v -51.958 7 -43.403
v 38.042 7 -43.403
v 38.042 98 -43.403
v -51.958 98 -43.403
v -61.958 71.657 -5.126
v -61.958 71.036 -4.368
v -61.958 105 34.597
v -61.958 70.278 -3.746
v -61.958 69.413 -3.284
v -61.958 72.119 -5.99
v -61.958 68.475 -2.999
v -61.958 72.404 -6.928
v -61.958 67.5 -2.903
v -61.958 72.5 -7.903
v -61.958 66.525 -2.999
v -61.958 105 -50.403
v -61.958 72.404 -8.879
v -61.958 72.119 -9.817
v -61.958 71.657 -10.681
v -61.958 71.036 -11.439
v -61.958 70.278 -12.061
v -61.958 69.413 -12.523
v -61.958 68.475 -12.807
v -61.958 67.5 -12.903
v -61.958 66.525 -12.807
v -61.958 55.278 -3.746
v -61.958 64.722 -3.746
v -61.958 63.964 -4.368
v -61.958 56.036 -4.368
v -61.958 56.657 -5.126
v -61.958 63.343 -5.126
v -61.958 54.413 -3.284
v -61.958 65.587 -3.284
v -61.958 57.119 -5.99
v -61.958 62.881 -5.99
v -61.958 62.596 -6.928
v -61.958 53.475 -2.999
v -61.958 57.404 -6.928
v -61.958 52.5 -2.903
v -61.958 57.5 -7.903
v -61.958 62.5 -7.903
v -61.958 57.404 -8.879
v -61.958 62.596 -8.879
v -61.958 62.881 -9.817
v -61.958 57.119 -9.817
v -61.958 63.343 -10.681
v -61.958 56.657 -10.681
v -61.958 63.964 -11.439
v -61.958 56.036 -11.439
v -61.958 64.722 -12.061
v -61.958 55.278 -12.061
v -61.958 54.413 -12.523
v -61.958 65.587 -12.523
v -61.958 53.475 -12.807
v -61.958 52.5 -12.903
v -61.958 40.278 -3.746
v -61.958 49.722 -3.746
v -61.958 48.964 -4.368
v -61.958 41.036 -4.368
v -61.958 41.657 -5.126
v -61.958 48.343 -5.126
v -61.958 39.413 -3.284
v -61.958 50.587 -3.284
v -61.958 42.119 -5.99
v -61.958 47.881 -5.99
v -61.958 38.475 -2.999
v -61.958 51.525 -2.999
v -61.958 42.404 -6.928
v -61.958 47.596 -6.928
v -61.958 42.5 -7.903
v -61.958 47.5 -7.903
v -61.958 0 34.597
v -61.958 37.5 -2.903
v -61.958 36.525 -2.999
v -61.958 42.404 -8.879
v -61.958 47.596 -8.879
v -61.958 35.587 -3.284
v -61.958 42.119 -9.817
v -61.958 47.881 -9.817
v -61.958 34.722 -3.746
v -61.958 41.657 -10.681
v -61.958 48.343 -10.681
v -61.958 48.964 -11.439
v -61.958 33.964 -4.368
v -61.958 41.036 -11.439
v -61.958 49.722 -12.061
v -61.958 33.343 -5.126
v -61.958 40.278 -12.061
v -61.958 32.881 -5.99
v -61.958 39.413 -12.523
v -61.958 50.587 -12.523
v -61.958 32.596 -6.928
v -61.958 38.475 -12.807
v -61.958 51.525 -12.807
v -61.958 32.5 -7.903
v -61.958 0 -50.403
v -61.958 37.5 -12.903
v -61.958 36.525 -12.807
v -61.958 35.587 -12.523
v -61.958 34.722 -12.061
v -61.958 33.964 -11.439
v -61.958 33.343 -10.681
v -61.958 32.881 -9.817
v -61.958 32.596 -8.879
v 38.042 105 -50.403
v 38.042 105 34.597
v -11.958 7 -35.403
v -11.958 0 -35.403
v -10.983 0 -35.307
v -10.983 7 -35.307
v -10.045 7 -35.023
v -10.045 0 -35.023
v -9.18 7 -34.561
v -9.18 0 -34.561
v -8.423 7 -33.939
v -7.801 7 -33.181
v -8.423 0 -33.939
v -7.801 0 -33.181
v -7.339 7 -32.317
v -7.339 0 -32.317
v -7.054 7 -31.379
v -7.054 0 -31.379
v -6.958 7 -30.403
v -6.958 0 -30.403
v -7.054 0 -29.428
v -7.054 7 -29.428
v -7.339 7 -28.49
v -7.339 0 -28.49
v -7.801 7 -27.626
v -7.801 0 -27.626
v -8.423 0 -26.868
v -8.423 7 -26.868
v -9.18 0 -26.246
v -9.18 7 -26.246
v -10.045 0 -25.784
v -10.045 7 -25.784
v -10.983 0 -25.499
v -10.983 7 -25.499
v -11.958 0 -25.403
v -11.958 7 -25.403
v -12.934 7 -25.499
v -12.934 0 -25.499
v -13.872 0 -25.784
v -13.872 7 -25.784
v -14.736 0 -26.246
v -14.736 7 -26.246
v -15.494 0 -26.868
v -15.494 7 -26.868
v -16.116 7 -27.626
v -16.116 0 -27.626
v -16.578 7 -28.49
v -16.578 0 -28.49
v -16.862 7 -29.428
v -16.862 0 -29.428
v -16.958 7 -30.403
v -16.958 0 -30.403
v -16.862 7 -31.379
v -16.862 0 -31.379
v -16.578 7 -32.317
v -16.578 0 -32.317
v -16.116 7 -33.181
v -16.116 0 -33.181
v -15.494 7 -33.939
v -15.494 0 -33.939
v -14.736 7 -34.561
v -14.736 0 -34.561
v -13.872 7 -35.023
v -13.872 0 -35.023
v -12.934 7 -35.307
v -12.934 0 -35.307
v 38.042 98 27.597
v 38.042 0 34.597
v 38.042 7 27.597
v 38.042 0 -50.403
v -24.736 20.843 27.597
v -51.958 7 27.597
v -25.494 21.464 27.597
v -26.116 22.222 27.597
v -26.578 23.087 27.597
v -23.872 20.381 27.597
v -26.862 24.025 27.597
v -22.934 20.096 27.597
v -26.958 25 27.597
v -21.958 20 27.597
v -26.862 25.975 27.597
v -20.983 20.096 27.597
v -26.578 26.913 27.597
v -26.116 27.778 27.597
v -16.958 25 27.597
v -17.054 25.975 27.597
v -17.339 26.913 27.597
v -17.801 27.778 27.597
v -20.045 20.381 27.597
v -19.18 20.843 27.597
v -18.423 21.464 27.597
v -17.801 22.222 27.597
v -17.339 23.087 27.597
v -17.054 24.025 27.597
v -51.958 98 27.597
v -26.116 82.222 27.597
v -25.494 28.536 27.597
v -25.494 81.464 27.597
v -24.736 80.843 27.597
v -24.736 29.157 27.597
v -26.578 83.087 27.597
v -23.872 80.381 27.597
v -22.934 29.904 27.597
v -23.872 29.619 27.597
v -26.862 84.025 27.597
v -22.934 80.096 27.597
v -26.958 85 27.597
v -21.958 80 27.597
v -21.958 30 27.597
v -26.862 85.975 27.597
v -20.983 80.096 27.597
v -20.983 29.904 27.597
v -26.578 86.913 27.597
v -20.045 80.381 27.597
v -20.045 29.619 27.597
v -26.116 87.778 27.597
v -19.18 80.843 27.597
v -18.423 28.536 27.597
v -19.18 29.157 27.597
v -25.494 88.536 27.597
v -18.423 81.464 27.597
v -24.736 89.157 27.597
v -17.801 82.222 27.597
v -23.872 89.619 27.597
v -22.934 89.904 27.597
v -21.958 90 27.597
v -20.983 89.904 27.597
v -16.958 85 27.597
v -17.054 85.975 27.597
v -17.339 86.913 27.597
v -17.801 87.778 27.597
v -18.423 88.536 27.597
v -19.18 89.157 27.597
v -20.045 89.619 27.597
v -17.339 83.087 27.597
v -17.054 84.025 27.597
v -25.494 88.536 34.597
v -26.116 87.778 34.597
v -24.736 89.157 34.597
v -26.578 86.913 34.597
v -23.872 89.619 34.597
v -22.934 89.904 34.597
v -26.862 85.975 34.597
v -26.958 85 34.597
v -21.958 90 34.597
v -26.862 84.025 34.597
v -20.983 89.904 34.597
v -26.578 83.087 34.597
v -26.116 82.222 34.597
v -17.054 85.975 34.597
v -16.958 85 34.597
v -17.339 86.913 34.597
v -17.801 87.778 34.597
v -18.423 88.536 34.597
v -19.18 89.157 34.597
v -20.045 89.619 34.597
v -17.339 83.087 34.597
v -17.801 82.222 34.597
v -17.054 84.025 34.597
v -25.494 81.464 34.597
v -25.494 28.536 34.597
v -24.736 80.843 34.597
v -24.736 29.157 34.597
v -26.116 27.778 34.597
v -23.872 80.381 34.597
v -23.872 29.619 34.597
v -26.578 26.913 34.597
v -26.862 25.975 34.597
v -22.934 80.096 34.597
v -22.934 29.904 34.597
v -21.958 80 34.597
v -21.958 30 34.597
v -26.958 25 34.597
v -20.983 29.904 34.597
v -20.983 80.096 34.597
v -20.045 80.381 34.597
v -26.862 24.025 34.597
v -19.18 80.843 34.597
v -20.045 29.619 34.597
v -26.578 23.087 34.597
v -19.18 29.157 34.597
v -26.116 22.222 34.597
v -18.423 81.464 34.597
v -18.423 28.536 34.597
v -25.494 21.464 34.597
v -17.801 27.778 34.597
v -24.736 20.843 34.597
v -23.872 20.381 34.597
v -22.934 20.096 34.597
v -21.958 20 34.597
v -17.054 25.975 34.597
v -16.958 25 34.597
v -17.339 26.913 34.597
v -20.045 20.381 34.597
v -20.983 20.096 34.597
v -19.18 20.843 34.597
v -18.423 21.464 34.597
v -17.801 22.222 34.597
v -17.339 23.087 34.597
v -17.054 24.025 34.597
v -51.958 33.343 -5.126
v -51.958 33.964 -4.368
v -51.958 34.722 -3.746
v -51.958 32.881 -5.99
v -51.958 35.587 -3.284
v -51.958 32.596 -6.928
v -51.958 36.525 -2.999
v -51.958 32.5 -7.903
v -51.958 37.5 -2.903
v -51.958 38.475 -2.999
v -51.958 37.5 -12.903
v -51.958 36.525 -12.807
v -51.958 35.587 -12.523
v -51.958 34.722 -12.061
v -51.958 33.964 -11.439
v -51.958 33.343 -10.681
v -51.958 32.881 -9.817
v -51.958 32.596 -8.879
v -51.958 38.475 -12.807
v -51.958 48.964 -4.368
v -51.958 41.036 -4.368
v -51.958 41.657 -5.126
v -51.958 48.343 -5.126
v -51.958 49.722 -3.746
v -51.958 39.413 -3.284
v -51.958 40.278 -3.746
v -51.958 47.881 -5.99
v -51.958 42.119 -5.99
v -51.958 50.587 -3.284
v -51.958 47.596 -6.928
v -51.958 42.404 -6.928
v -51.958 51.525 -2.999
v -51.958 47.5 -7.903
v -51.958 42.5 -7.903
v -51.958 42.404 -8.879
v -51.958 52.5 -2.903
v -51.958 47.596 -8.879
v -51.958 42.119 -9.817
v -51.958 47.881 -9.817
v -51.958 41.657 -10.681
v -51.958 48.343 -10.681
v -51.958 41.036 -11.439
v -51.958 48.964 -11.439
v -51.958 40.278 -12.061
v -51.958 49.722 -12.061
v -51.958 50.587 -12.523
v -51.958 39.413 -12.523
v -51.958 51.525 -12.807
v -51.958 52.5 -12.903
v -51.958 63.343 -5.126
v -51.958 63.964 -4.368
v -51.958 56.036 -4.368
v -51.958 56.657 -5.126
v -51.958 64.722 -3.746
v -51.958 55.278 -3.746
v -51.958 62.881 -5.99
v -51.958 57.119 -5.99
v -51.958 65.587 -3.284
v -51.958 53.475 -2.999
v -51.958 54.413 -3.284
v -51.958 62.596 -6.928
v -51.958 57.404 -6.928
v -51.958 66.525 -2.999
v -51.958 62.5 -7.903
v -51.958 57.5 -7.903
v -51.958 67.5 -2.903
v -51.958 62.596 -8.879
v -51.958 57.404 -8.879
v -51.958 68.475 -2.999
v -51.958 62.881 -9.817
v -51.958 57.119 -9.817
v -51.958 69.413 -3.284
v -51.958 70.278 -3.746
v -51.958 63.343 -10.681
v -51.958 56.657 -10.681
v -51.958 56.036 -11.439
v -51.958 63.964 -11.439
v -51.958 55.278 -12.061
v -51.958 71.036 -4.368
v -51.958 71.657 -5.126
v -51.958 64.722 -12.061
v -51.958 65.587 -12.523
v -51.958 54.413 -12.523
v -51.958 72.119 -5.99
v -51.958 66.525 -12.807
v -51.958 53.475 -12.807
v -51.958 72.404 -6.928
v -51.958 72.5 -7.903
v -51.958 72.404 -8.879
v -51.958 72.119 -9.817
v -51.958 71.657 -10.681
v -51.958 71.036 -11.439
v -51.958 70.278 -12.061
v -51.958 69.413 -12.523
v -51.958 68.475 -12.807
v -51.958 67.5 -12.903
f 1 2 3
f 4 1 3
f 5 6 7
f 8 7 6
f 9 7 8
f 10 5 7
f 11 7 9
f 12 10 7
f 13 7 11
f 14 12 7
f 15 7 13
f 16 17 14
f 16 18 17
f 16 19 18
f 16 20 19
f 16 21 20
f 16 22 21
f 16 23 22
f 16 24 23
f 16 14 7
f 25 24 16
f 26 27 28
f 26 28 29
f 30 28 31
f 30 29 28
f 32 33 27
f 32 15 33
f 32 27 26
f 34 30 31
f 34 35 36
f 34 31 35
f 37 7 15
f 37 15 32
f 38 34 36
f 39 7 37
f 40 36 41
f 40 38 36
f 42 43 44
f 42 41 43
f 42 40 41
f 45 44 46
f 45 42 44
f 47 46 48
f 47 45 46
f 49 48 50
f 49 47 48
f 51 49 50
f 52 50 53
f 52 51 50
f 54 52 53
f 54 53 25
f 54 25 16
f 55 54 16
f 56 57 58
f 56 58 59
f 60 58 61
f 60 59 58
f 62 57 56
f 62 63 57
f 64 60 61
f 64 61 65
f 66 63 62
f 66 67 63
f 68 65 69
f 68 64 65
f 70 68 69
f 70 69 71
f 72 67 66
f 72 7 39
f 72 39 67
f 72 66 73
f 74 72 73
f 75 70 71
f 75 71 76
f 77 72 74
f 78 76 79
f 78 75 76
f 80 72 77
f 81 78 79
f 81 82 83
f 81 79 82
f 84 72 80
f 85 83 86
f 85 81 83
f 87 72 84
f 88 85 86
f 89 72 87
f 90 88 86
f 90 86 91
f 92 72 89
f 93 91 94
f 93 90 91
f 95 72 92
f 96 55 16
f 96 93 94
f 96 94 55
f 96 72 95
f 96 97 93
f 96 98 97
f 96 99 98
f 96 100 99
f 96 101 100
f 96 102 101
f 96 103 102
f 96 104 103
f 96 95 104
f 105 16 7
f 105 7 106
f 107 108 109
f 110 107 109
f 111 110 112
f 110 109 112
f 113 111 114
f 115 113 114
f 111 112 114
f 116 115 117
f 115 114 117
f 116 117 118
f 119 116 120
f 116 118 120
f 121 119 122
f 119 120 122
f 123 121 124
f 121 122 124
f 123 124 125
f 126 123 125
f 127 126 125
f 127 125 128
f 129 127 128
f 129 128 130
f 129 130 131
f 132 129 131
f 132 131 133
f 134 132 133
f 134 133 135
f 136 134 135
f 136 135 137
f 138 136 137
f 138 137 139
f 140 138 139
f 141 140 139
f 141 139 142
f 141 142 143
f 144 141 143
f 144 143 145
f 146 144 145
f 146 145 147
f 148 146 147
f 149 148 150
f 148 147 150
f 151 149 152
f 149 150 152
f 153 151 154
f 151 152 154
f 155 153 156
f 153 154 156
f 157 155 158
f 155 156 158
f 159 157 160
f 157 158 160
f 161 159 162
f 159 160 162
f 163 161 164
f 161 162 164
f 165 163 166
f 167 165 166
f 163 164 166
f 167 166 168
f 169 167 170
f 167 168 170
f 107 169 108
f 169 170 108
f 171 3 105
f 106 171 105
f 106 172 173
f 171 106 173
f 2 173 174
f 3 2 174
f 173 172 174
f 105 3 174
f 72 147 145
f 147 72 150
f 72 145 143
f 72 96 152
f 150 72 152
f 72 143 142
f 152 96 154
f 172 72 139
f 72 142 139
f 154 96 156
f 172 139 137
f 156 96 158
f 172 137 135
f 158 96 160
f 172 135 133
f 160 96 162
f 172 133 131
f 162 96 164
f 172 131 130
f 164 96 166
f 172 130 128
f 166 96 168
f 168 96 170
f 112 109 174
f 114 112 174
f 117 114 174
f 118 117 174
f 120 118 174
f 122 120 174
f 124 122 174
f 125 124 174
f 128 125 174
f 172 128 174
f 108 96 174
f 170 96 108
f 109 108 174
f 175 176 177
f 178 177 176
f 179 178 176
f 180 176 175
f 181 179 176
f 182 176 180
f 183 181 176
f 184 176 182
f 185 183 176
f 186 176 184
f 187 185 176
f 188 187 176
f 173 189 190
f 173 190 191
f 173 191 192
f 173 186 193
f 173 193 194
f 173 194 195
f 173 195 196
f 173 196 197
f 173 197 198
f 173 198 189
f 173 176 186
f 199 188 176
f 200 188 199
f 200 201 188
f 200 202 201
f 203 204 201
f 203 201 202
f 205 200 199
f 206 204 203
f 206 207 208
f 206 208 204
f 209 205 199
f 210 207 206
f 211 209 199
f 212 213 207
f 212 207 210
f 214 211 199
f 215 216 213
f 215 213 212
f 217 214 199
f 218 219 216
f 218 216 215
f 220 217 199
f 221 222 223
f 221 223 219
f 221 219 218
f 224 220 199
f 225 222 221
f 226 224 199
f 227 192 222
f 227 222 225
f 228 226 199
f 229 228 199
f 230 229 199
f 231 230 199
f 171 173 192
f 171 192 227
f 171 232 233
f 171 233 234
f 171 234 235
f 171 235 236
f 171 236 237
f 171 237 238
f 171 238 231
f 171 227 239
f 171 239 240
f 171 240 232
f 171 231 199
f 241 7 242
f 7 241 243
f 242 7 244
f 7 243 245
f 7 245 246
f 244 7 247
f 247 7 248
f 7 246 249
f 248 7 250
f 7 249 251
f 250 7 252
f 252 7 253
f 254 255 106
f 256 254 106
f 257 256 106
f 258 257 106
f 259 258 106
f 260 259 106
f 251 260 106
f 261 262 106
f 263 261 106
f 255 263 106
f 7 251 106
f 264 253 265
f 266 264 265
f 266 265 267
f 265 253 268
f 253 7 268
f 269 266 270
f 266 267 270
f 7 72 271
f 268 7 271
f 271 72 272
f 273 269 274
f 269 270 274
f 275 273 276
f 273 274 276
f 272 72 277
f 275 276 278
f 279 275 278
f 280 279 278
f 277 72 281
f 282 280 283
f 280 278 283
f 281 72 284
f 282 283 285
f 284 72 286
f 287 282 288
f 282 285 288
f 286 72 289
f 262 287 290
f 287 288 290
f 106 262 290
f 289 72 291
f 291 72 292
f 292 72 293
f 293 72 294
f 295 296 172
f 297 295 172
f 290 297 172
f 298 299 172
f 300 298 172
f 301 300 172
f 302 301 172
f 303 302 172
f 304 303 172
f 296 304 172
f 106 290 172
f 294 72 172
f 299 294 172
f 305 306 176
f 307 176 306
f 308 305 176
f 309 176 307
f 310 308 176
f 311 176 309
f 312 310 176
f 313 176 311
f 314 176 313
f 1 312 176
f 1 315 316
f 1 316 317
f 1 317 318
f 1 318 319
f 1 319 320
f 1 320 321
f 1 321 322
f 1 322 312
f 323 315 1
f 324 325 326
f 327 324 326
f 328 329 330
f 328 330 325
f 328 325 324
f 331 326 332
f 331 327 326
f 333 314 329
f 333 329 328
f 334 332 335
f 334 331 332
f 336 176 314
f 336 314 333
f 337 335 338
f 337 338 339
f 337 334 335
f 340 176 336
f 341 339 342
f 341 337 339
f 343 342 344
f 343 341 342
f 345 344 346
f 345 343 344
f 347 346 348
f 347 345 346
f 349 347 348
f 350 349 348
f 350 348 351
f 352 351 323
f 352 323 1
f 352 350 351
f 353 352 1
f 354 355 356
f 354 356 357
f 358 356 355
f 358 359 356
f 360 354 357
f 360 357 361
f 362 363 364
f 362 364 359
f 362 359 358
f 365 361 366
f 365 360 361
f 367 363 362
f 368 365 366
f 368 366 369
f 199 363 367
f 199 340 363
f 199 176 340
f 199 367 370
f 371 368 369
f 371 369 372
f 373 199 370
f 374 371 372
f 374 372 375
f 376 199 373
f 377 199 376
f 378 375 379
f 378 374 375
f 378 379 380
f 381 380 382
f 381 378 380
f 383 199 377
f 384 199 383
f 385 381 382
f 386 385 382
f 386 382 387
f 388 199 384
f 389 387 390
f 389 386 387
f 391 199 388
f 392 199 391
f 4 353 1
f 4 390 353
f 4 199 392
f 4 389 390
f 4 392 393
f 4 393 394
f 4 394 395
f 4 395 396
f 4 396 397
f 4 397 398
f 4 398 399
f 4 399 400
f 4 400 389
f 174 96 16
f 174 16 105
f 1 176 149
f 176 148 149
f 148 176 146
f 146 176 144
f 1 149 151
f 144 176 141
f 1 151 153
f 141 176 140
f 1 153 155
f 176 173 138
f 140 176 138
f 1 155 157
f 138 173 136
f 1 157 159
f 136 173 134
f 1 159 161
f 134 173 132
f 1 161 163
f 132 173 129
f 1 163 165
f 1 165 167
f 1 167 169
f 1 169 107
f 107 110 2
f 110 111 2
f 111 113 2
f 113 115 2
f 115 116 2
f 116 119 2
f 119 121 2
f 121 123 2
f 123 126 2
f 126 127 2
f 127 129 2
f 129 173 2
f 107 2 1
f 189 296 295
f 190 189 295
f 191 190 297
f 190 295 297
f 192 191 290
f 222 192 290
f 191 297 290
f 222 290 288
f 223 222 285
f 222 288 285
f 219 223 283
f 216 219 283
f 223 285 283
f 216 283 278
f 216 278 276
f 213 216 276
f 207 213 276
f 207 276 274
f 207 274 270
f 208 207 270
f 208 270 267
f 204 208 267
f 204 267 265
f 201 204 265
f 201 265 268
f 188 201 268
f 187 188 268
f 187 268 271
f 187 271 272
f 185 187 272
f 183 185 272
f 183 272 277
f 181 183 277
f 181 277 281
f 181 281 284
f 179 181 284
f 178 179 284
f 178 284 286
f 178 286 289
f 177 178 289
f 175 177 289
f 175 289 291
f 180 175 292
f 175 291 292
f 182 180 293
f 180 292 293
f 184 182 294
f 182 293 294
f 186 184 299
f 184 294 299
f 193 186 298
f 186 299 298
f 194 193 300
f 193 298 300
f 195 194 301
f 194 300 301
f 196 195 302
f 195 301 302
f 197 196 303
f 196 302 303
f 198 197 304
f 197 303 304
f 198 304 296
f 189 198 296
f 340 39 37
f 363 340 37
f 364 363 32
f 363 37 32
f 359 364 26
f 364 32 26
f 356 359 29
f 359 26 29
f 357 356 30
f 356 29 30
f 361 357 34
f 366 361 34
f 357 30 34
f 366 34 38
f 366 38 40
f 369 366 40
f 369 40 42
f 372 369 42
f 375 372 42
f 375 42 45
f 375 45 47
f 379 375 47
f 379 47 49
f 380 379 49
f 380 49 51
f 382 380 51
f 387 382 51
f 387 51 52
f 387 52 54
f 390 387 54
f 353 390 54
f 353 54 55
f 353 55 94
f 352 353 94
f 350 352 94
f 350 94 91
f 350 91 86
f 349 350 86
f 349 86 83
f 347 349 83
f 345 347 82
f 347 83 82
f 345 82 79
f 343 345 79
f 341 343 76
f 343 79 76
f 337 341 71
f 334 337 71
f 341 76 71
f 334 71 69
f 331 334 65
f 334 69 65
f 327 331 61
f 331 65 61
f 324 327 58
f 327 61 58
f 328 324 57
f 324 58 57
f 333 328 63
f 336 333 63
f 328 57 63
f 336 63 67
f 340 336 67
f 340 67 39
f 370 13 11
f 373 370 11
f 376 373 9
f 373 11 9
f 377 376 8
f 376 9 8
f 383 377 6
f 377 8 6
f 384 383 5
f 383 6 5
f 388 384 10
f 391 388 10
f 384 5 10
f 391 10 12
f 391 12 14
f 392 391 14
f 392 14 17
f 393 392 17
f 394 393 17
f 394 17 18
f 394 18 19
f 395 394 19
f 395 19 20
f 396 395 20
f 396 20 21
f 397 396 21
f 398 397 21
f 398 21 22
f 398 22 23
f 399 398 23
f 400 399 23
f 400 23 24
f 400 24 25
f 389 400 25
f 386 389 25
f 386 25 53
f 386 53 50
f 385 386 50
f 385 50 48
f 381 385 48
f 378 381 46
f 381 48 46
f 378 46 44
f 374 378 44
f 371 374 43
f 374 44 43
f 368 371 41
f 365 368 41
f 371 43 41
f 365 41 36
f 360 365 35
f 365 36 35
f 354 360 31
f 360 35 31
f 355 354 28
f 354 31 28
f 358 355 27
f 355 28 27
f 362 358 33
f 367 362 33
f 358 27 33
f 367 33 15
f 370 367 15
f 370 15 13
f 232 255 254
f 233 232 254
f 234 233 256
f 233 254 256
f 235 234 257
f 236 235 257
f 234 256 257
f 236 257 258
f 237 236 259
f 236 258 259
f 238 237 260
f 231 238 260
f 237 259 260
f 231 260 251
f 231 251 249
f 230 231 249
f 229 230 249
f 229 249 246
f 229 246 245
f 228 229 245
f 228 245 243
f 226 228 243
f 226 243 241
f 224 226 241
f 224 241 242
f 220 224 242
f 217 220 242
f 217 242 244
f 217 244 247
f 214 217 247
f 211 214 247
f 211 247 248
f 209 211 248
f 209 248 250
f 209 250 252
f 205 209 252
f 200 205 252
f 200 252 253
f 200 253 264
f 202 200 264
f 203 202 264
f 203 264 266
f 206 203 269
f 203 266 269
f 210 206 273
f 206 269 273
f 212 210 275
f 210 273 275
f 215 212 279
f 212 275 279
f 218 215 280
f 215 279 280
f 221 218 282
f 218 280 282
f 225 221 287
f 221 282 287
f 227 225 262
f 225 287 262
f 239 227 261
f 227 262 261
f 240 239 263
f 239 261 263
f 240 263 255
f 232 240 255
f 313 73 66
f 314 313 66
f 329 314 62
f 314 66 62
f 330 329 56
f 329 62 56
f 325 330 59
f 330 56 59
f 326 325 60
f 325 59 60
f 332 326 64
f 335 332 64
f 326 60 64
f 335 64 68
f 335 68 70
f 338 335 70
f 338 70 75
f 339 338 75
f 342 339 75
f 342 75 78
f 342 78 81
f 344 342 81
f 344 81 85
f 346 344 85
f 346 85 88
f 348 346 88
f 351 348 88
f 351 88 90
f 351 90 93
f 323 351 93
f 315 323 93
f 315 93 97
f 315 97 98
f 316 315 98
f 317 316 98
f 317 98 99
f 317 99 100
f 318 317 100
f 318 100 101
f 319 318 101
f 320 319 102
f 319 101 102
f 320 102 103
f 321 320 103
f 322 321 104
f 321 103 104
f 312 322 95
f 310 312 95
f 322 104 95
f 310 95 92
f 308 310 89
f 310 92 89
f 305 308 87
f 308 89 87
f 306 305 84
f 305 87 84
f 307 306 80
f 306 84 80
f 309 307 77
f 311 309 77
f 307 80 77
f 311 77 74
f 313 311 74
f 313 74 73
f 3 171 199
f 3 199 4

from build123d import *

# Parameters (mm, degrees)
SKETCH1_W                        = 100
SKETCH1_H                        = 85
BOSS_EXTRUDE1_DEPTH              = 105
SKETCH2_W                        = 71
SKETCH2_H                        = 91
CUT_EXTRUDE1_DEPTH               = 90
M10X1_0_TAPPED_HOLE1_D           = 9
M10X1_0_TAPPED_HOLE1_DEPTH       = 23
M10X1_0_TAPPED_HOLE1_CBORE_D     = 10
M10X1_0_TAPPED_HOLE1_CBORE_DEPTH = 20
M10X1_0_TAPPED_HOLE1_TIP         = 2.703872786
M10X1_0_TAPPED_HOLE2_D           = 9
M10X1_0_TAPPED_HOLE2_DEPTH       = 23
M10X1_0_TAPPED_HOLE2_CBORE_D     = 10
M10X1_0_TAPPED_HOLE2_CBORE_DEPTH = 20
M10X1_0_TAPPED_HOLE2_TIP         = 2.703872786
M10X1_0_TAPPED_HOLE3_D           = 9
M10X1_0_TAPPED_HOLE3_DEPTH       = 23
M10X1_0_TAPPED_HOLE3_CBORE_D     = 10
M10X1_0_TAPPED_HOLE3_CBORE_DEPTH = 20
M10X1_0_TAPPED_HOLE3_TIP         = 2.703872786


with BuildPart() as part:
    # Sketch1 → Boss-Extrude1 (new body)
    with BuildSketch(Plane(origin=(0, 0, 0), x_dir=(1, 0, 0), z_dir=(0, 1, 0))):
        with Locations((-11.958288623, 7.903366629)):
            Rectangle(SKETCH1_W, SKETCH1_H)
    extrude(amount=BOSS_EXTRUDE1_DEPTH)

    # Sketch2 → Cut-Extrude1 (cut)
    with BuildSketch(Plane(origin=(38.041711377, 0, 0), x_dir=(0, 0, -1), z_dir=(1, 0, 0))):
        with Locations((7.903366629, 52.5)):
            Rectangle(SKETCH2_W, SKETCH2_H)
    extrude(amount=-CUT_EXTRUDE1_DEPTH, mode=Mode.SUBTRACT)

    # M10x1.0 Tapped Hole1
    with Locations(Plane(origin=(-21.958288623, 85, 34.596633371), x_dir=(1, 0, 0), z_dir=(0, 0, 1))):
        with Locations((0, 0), (0, -60)):
            CounterBoreHole(M10X1_0_TAPPED_HOLE1_D / 2, M10X1_0_TAPPED_HOLE1_CBORE_D / 2, M10X1_0_TAPPED_HOLE1_CBORE_DEPTH, depth=M10X1_0_TAPPED_HOLE1_DEPTH)
            with Locations((0, 0, -(M10X1_0_TAPPED_HOLE1_DEPTH + M10X1_0_TAPPED_HOLE1_TIP / 2))):  # 118° drill point
                Cone(0, M10X1_0_TAPPED_HOLE1_D / 2, M10X1_0_TAPPED_HOLE1_TIP, mode=Mode.SUBTRACT)

    # M10x1.0 Tapped Hole2
    with Locations(Plane(origin=(-11.958288623, 0, -30.403366629), x_dir=(0, 0, -1), z_dir=(0, -1, 0))):
        with Locations((0, 0)):
            CounterBoreHole(M10X1_0_TAPPED_HOLE2_D / 2, M10X1_0_TAPPED_HOLE2_CBORE_D / 2, M10X1_0_TAPPED_HOLE2_CBORE_DEPTH, depth=M10X1_0_TAPPED_HOLE2_DEPTH)
            with Locations((0, 0, -(M10X1_0_TAPPED_HOLE2_DEPTH + M10X1_0_TAPPED_HOLE2_TIP / 2))):  # 118° drill point
                Cone(0, M10X1_0_TAPPED_HOLE2_D / 2, M10X1_0_TAPPED_HOLE2_TIP, mode=Mode.SUBTRACT)

    # M10x1.0 Tapped Hole3
    with Locations(Plane.ZY.offset(61.958288623)):
        with Locations((-7.903366629, 37.5), (-7.903366629, 52.5), (-7.903366629, 67.5)):
            CounterBoreHole(M10X1_0_TAPPED_HOLE3_D / 2, M10X1_0_TAPPED_HOLE3_CBORE_D / 2, M10X1_0_TAPPED_HOLE3_CBORE_DEPTH, depth=M10X1_0_TAPPED_HOLE3_DEPTH)
            with Locations((0, 0, -(M10X1_0_TAPPED_HOLE3_DEPTH + M10X1_0_TAPPED_HOLE3_TIP / 2))):  # 118° drill point
                Cone(0, M10X1_0_TAPPED_HOLE3_D / 2, M10X1_0_TAPPED_HOLE3_TIP, mode=Mode.SUBTRACT)


solid = part.part
